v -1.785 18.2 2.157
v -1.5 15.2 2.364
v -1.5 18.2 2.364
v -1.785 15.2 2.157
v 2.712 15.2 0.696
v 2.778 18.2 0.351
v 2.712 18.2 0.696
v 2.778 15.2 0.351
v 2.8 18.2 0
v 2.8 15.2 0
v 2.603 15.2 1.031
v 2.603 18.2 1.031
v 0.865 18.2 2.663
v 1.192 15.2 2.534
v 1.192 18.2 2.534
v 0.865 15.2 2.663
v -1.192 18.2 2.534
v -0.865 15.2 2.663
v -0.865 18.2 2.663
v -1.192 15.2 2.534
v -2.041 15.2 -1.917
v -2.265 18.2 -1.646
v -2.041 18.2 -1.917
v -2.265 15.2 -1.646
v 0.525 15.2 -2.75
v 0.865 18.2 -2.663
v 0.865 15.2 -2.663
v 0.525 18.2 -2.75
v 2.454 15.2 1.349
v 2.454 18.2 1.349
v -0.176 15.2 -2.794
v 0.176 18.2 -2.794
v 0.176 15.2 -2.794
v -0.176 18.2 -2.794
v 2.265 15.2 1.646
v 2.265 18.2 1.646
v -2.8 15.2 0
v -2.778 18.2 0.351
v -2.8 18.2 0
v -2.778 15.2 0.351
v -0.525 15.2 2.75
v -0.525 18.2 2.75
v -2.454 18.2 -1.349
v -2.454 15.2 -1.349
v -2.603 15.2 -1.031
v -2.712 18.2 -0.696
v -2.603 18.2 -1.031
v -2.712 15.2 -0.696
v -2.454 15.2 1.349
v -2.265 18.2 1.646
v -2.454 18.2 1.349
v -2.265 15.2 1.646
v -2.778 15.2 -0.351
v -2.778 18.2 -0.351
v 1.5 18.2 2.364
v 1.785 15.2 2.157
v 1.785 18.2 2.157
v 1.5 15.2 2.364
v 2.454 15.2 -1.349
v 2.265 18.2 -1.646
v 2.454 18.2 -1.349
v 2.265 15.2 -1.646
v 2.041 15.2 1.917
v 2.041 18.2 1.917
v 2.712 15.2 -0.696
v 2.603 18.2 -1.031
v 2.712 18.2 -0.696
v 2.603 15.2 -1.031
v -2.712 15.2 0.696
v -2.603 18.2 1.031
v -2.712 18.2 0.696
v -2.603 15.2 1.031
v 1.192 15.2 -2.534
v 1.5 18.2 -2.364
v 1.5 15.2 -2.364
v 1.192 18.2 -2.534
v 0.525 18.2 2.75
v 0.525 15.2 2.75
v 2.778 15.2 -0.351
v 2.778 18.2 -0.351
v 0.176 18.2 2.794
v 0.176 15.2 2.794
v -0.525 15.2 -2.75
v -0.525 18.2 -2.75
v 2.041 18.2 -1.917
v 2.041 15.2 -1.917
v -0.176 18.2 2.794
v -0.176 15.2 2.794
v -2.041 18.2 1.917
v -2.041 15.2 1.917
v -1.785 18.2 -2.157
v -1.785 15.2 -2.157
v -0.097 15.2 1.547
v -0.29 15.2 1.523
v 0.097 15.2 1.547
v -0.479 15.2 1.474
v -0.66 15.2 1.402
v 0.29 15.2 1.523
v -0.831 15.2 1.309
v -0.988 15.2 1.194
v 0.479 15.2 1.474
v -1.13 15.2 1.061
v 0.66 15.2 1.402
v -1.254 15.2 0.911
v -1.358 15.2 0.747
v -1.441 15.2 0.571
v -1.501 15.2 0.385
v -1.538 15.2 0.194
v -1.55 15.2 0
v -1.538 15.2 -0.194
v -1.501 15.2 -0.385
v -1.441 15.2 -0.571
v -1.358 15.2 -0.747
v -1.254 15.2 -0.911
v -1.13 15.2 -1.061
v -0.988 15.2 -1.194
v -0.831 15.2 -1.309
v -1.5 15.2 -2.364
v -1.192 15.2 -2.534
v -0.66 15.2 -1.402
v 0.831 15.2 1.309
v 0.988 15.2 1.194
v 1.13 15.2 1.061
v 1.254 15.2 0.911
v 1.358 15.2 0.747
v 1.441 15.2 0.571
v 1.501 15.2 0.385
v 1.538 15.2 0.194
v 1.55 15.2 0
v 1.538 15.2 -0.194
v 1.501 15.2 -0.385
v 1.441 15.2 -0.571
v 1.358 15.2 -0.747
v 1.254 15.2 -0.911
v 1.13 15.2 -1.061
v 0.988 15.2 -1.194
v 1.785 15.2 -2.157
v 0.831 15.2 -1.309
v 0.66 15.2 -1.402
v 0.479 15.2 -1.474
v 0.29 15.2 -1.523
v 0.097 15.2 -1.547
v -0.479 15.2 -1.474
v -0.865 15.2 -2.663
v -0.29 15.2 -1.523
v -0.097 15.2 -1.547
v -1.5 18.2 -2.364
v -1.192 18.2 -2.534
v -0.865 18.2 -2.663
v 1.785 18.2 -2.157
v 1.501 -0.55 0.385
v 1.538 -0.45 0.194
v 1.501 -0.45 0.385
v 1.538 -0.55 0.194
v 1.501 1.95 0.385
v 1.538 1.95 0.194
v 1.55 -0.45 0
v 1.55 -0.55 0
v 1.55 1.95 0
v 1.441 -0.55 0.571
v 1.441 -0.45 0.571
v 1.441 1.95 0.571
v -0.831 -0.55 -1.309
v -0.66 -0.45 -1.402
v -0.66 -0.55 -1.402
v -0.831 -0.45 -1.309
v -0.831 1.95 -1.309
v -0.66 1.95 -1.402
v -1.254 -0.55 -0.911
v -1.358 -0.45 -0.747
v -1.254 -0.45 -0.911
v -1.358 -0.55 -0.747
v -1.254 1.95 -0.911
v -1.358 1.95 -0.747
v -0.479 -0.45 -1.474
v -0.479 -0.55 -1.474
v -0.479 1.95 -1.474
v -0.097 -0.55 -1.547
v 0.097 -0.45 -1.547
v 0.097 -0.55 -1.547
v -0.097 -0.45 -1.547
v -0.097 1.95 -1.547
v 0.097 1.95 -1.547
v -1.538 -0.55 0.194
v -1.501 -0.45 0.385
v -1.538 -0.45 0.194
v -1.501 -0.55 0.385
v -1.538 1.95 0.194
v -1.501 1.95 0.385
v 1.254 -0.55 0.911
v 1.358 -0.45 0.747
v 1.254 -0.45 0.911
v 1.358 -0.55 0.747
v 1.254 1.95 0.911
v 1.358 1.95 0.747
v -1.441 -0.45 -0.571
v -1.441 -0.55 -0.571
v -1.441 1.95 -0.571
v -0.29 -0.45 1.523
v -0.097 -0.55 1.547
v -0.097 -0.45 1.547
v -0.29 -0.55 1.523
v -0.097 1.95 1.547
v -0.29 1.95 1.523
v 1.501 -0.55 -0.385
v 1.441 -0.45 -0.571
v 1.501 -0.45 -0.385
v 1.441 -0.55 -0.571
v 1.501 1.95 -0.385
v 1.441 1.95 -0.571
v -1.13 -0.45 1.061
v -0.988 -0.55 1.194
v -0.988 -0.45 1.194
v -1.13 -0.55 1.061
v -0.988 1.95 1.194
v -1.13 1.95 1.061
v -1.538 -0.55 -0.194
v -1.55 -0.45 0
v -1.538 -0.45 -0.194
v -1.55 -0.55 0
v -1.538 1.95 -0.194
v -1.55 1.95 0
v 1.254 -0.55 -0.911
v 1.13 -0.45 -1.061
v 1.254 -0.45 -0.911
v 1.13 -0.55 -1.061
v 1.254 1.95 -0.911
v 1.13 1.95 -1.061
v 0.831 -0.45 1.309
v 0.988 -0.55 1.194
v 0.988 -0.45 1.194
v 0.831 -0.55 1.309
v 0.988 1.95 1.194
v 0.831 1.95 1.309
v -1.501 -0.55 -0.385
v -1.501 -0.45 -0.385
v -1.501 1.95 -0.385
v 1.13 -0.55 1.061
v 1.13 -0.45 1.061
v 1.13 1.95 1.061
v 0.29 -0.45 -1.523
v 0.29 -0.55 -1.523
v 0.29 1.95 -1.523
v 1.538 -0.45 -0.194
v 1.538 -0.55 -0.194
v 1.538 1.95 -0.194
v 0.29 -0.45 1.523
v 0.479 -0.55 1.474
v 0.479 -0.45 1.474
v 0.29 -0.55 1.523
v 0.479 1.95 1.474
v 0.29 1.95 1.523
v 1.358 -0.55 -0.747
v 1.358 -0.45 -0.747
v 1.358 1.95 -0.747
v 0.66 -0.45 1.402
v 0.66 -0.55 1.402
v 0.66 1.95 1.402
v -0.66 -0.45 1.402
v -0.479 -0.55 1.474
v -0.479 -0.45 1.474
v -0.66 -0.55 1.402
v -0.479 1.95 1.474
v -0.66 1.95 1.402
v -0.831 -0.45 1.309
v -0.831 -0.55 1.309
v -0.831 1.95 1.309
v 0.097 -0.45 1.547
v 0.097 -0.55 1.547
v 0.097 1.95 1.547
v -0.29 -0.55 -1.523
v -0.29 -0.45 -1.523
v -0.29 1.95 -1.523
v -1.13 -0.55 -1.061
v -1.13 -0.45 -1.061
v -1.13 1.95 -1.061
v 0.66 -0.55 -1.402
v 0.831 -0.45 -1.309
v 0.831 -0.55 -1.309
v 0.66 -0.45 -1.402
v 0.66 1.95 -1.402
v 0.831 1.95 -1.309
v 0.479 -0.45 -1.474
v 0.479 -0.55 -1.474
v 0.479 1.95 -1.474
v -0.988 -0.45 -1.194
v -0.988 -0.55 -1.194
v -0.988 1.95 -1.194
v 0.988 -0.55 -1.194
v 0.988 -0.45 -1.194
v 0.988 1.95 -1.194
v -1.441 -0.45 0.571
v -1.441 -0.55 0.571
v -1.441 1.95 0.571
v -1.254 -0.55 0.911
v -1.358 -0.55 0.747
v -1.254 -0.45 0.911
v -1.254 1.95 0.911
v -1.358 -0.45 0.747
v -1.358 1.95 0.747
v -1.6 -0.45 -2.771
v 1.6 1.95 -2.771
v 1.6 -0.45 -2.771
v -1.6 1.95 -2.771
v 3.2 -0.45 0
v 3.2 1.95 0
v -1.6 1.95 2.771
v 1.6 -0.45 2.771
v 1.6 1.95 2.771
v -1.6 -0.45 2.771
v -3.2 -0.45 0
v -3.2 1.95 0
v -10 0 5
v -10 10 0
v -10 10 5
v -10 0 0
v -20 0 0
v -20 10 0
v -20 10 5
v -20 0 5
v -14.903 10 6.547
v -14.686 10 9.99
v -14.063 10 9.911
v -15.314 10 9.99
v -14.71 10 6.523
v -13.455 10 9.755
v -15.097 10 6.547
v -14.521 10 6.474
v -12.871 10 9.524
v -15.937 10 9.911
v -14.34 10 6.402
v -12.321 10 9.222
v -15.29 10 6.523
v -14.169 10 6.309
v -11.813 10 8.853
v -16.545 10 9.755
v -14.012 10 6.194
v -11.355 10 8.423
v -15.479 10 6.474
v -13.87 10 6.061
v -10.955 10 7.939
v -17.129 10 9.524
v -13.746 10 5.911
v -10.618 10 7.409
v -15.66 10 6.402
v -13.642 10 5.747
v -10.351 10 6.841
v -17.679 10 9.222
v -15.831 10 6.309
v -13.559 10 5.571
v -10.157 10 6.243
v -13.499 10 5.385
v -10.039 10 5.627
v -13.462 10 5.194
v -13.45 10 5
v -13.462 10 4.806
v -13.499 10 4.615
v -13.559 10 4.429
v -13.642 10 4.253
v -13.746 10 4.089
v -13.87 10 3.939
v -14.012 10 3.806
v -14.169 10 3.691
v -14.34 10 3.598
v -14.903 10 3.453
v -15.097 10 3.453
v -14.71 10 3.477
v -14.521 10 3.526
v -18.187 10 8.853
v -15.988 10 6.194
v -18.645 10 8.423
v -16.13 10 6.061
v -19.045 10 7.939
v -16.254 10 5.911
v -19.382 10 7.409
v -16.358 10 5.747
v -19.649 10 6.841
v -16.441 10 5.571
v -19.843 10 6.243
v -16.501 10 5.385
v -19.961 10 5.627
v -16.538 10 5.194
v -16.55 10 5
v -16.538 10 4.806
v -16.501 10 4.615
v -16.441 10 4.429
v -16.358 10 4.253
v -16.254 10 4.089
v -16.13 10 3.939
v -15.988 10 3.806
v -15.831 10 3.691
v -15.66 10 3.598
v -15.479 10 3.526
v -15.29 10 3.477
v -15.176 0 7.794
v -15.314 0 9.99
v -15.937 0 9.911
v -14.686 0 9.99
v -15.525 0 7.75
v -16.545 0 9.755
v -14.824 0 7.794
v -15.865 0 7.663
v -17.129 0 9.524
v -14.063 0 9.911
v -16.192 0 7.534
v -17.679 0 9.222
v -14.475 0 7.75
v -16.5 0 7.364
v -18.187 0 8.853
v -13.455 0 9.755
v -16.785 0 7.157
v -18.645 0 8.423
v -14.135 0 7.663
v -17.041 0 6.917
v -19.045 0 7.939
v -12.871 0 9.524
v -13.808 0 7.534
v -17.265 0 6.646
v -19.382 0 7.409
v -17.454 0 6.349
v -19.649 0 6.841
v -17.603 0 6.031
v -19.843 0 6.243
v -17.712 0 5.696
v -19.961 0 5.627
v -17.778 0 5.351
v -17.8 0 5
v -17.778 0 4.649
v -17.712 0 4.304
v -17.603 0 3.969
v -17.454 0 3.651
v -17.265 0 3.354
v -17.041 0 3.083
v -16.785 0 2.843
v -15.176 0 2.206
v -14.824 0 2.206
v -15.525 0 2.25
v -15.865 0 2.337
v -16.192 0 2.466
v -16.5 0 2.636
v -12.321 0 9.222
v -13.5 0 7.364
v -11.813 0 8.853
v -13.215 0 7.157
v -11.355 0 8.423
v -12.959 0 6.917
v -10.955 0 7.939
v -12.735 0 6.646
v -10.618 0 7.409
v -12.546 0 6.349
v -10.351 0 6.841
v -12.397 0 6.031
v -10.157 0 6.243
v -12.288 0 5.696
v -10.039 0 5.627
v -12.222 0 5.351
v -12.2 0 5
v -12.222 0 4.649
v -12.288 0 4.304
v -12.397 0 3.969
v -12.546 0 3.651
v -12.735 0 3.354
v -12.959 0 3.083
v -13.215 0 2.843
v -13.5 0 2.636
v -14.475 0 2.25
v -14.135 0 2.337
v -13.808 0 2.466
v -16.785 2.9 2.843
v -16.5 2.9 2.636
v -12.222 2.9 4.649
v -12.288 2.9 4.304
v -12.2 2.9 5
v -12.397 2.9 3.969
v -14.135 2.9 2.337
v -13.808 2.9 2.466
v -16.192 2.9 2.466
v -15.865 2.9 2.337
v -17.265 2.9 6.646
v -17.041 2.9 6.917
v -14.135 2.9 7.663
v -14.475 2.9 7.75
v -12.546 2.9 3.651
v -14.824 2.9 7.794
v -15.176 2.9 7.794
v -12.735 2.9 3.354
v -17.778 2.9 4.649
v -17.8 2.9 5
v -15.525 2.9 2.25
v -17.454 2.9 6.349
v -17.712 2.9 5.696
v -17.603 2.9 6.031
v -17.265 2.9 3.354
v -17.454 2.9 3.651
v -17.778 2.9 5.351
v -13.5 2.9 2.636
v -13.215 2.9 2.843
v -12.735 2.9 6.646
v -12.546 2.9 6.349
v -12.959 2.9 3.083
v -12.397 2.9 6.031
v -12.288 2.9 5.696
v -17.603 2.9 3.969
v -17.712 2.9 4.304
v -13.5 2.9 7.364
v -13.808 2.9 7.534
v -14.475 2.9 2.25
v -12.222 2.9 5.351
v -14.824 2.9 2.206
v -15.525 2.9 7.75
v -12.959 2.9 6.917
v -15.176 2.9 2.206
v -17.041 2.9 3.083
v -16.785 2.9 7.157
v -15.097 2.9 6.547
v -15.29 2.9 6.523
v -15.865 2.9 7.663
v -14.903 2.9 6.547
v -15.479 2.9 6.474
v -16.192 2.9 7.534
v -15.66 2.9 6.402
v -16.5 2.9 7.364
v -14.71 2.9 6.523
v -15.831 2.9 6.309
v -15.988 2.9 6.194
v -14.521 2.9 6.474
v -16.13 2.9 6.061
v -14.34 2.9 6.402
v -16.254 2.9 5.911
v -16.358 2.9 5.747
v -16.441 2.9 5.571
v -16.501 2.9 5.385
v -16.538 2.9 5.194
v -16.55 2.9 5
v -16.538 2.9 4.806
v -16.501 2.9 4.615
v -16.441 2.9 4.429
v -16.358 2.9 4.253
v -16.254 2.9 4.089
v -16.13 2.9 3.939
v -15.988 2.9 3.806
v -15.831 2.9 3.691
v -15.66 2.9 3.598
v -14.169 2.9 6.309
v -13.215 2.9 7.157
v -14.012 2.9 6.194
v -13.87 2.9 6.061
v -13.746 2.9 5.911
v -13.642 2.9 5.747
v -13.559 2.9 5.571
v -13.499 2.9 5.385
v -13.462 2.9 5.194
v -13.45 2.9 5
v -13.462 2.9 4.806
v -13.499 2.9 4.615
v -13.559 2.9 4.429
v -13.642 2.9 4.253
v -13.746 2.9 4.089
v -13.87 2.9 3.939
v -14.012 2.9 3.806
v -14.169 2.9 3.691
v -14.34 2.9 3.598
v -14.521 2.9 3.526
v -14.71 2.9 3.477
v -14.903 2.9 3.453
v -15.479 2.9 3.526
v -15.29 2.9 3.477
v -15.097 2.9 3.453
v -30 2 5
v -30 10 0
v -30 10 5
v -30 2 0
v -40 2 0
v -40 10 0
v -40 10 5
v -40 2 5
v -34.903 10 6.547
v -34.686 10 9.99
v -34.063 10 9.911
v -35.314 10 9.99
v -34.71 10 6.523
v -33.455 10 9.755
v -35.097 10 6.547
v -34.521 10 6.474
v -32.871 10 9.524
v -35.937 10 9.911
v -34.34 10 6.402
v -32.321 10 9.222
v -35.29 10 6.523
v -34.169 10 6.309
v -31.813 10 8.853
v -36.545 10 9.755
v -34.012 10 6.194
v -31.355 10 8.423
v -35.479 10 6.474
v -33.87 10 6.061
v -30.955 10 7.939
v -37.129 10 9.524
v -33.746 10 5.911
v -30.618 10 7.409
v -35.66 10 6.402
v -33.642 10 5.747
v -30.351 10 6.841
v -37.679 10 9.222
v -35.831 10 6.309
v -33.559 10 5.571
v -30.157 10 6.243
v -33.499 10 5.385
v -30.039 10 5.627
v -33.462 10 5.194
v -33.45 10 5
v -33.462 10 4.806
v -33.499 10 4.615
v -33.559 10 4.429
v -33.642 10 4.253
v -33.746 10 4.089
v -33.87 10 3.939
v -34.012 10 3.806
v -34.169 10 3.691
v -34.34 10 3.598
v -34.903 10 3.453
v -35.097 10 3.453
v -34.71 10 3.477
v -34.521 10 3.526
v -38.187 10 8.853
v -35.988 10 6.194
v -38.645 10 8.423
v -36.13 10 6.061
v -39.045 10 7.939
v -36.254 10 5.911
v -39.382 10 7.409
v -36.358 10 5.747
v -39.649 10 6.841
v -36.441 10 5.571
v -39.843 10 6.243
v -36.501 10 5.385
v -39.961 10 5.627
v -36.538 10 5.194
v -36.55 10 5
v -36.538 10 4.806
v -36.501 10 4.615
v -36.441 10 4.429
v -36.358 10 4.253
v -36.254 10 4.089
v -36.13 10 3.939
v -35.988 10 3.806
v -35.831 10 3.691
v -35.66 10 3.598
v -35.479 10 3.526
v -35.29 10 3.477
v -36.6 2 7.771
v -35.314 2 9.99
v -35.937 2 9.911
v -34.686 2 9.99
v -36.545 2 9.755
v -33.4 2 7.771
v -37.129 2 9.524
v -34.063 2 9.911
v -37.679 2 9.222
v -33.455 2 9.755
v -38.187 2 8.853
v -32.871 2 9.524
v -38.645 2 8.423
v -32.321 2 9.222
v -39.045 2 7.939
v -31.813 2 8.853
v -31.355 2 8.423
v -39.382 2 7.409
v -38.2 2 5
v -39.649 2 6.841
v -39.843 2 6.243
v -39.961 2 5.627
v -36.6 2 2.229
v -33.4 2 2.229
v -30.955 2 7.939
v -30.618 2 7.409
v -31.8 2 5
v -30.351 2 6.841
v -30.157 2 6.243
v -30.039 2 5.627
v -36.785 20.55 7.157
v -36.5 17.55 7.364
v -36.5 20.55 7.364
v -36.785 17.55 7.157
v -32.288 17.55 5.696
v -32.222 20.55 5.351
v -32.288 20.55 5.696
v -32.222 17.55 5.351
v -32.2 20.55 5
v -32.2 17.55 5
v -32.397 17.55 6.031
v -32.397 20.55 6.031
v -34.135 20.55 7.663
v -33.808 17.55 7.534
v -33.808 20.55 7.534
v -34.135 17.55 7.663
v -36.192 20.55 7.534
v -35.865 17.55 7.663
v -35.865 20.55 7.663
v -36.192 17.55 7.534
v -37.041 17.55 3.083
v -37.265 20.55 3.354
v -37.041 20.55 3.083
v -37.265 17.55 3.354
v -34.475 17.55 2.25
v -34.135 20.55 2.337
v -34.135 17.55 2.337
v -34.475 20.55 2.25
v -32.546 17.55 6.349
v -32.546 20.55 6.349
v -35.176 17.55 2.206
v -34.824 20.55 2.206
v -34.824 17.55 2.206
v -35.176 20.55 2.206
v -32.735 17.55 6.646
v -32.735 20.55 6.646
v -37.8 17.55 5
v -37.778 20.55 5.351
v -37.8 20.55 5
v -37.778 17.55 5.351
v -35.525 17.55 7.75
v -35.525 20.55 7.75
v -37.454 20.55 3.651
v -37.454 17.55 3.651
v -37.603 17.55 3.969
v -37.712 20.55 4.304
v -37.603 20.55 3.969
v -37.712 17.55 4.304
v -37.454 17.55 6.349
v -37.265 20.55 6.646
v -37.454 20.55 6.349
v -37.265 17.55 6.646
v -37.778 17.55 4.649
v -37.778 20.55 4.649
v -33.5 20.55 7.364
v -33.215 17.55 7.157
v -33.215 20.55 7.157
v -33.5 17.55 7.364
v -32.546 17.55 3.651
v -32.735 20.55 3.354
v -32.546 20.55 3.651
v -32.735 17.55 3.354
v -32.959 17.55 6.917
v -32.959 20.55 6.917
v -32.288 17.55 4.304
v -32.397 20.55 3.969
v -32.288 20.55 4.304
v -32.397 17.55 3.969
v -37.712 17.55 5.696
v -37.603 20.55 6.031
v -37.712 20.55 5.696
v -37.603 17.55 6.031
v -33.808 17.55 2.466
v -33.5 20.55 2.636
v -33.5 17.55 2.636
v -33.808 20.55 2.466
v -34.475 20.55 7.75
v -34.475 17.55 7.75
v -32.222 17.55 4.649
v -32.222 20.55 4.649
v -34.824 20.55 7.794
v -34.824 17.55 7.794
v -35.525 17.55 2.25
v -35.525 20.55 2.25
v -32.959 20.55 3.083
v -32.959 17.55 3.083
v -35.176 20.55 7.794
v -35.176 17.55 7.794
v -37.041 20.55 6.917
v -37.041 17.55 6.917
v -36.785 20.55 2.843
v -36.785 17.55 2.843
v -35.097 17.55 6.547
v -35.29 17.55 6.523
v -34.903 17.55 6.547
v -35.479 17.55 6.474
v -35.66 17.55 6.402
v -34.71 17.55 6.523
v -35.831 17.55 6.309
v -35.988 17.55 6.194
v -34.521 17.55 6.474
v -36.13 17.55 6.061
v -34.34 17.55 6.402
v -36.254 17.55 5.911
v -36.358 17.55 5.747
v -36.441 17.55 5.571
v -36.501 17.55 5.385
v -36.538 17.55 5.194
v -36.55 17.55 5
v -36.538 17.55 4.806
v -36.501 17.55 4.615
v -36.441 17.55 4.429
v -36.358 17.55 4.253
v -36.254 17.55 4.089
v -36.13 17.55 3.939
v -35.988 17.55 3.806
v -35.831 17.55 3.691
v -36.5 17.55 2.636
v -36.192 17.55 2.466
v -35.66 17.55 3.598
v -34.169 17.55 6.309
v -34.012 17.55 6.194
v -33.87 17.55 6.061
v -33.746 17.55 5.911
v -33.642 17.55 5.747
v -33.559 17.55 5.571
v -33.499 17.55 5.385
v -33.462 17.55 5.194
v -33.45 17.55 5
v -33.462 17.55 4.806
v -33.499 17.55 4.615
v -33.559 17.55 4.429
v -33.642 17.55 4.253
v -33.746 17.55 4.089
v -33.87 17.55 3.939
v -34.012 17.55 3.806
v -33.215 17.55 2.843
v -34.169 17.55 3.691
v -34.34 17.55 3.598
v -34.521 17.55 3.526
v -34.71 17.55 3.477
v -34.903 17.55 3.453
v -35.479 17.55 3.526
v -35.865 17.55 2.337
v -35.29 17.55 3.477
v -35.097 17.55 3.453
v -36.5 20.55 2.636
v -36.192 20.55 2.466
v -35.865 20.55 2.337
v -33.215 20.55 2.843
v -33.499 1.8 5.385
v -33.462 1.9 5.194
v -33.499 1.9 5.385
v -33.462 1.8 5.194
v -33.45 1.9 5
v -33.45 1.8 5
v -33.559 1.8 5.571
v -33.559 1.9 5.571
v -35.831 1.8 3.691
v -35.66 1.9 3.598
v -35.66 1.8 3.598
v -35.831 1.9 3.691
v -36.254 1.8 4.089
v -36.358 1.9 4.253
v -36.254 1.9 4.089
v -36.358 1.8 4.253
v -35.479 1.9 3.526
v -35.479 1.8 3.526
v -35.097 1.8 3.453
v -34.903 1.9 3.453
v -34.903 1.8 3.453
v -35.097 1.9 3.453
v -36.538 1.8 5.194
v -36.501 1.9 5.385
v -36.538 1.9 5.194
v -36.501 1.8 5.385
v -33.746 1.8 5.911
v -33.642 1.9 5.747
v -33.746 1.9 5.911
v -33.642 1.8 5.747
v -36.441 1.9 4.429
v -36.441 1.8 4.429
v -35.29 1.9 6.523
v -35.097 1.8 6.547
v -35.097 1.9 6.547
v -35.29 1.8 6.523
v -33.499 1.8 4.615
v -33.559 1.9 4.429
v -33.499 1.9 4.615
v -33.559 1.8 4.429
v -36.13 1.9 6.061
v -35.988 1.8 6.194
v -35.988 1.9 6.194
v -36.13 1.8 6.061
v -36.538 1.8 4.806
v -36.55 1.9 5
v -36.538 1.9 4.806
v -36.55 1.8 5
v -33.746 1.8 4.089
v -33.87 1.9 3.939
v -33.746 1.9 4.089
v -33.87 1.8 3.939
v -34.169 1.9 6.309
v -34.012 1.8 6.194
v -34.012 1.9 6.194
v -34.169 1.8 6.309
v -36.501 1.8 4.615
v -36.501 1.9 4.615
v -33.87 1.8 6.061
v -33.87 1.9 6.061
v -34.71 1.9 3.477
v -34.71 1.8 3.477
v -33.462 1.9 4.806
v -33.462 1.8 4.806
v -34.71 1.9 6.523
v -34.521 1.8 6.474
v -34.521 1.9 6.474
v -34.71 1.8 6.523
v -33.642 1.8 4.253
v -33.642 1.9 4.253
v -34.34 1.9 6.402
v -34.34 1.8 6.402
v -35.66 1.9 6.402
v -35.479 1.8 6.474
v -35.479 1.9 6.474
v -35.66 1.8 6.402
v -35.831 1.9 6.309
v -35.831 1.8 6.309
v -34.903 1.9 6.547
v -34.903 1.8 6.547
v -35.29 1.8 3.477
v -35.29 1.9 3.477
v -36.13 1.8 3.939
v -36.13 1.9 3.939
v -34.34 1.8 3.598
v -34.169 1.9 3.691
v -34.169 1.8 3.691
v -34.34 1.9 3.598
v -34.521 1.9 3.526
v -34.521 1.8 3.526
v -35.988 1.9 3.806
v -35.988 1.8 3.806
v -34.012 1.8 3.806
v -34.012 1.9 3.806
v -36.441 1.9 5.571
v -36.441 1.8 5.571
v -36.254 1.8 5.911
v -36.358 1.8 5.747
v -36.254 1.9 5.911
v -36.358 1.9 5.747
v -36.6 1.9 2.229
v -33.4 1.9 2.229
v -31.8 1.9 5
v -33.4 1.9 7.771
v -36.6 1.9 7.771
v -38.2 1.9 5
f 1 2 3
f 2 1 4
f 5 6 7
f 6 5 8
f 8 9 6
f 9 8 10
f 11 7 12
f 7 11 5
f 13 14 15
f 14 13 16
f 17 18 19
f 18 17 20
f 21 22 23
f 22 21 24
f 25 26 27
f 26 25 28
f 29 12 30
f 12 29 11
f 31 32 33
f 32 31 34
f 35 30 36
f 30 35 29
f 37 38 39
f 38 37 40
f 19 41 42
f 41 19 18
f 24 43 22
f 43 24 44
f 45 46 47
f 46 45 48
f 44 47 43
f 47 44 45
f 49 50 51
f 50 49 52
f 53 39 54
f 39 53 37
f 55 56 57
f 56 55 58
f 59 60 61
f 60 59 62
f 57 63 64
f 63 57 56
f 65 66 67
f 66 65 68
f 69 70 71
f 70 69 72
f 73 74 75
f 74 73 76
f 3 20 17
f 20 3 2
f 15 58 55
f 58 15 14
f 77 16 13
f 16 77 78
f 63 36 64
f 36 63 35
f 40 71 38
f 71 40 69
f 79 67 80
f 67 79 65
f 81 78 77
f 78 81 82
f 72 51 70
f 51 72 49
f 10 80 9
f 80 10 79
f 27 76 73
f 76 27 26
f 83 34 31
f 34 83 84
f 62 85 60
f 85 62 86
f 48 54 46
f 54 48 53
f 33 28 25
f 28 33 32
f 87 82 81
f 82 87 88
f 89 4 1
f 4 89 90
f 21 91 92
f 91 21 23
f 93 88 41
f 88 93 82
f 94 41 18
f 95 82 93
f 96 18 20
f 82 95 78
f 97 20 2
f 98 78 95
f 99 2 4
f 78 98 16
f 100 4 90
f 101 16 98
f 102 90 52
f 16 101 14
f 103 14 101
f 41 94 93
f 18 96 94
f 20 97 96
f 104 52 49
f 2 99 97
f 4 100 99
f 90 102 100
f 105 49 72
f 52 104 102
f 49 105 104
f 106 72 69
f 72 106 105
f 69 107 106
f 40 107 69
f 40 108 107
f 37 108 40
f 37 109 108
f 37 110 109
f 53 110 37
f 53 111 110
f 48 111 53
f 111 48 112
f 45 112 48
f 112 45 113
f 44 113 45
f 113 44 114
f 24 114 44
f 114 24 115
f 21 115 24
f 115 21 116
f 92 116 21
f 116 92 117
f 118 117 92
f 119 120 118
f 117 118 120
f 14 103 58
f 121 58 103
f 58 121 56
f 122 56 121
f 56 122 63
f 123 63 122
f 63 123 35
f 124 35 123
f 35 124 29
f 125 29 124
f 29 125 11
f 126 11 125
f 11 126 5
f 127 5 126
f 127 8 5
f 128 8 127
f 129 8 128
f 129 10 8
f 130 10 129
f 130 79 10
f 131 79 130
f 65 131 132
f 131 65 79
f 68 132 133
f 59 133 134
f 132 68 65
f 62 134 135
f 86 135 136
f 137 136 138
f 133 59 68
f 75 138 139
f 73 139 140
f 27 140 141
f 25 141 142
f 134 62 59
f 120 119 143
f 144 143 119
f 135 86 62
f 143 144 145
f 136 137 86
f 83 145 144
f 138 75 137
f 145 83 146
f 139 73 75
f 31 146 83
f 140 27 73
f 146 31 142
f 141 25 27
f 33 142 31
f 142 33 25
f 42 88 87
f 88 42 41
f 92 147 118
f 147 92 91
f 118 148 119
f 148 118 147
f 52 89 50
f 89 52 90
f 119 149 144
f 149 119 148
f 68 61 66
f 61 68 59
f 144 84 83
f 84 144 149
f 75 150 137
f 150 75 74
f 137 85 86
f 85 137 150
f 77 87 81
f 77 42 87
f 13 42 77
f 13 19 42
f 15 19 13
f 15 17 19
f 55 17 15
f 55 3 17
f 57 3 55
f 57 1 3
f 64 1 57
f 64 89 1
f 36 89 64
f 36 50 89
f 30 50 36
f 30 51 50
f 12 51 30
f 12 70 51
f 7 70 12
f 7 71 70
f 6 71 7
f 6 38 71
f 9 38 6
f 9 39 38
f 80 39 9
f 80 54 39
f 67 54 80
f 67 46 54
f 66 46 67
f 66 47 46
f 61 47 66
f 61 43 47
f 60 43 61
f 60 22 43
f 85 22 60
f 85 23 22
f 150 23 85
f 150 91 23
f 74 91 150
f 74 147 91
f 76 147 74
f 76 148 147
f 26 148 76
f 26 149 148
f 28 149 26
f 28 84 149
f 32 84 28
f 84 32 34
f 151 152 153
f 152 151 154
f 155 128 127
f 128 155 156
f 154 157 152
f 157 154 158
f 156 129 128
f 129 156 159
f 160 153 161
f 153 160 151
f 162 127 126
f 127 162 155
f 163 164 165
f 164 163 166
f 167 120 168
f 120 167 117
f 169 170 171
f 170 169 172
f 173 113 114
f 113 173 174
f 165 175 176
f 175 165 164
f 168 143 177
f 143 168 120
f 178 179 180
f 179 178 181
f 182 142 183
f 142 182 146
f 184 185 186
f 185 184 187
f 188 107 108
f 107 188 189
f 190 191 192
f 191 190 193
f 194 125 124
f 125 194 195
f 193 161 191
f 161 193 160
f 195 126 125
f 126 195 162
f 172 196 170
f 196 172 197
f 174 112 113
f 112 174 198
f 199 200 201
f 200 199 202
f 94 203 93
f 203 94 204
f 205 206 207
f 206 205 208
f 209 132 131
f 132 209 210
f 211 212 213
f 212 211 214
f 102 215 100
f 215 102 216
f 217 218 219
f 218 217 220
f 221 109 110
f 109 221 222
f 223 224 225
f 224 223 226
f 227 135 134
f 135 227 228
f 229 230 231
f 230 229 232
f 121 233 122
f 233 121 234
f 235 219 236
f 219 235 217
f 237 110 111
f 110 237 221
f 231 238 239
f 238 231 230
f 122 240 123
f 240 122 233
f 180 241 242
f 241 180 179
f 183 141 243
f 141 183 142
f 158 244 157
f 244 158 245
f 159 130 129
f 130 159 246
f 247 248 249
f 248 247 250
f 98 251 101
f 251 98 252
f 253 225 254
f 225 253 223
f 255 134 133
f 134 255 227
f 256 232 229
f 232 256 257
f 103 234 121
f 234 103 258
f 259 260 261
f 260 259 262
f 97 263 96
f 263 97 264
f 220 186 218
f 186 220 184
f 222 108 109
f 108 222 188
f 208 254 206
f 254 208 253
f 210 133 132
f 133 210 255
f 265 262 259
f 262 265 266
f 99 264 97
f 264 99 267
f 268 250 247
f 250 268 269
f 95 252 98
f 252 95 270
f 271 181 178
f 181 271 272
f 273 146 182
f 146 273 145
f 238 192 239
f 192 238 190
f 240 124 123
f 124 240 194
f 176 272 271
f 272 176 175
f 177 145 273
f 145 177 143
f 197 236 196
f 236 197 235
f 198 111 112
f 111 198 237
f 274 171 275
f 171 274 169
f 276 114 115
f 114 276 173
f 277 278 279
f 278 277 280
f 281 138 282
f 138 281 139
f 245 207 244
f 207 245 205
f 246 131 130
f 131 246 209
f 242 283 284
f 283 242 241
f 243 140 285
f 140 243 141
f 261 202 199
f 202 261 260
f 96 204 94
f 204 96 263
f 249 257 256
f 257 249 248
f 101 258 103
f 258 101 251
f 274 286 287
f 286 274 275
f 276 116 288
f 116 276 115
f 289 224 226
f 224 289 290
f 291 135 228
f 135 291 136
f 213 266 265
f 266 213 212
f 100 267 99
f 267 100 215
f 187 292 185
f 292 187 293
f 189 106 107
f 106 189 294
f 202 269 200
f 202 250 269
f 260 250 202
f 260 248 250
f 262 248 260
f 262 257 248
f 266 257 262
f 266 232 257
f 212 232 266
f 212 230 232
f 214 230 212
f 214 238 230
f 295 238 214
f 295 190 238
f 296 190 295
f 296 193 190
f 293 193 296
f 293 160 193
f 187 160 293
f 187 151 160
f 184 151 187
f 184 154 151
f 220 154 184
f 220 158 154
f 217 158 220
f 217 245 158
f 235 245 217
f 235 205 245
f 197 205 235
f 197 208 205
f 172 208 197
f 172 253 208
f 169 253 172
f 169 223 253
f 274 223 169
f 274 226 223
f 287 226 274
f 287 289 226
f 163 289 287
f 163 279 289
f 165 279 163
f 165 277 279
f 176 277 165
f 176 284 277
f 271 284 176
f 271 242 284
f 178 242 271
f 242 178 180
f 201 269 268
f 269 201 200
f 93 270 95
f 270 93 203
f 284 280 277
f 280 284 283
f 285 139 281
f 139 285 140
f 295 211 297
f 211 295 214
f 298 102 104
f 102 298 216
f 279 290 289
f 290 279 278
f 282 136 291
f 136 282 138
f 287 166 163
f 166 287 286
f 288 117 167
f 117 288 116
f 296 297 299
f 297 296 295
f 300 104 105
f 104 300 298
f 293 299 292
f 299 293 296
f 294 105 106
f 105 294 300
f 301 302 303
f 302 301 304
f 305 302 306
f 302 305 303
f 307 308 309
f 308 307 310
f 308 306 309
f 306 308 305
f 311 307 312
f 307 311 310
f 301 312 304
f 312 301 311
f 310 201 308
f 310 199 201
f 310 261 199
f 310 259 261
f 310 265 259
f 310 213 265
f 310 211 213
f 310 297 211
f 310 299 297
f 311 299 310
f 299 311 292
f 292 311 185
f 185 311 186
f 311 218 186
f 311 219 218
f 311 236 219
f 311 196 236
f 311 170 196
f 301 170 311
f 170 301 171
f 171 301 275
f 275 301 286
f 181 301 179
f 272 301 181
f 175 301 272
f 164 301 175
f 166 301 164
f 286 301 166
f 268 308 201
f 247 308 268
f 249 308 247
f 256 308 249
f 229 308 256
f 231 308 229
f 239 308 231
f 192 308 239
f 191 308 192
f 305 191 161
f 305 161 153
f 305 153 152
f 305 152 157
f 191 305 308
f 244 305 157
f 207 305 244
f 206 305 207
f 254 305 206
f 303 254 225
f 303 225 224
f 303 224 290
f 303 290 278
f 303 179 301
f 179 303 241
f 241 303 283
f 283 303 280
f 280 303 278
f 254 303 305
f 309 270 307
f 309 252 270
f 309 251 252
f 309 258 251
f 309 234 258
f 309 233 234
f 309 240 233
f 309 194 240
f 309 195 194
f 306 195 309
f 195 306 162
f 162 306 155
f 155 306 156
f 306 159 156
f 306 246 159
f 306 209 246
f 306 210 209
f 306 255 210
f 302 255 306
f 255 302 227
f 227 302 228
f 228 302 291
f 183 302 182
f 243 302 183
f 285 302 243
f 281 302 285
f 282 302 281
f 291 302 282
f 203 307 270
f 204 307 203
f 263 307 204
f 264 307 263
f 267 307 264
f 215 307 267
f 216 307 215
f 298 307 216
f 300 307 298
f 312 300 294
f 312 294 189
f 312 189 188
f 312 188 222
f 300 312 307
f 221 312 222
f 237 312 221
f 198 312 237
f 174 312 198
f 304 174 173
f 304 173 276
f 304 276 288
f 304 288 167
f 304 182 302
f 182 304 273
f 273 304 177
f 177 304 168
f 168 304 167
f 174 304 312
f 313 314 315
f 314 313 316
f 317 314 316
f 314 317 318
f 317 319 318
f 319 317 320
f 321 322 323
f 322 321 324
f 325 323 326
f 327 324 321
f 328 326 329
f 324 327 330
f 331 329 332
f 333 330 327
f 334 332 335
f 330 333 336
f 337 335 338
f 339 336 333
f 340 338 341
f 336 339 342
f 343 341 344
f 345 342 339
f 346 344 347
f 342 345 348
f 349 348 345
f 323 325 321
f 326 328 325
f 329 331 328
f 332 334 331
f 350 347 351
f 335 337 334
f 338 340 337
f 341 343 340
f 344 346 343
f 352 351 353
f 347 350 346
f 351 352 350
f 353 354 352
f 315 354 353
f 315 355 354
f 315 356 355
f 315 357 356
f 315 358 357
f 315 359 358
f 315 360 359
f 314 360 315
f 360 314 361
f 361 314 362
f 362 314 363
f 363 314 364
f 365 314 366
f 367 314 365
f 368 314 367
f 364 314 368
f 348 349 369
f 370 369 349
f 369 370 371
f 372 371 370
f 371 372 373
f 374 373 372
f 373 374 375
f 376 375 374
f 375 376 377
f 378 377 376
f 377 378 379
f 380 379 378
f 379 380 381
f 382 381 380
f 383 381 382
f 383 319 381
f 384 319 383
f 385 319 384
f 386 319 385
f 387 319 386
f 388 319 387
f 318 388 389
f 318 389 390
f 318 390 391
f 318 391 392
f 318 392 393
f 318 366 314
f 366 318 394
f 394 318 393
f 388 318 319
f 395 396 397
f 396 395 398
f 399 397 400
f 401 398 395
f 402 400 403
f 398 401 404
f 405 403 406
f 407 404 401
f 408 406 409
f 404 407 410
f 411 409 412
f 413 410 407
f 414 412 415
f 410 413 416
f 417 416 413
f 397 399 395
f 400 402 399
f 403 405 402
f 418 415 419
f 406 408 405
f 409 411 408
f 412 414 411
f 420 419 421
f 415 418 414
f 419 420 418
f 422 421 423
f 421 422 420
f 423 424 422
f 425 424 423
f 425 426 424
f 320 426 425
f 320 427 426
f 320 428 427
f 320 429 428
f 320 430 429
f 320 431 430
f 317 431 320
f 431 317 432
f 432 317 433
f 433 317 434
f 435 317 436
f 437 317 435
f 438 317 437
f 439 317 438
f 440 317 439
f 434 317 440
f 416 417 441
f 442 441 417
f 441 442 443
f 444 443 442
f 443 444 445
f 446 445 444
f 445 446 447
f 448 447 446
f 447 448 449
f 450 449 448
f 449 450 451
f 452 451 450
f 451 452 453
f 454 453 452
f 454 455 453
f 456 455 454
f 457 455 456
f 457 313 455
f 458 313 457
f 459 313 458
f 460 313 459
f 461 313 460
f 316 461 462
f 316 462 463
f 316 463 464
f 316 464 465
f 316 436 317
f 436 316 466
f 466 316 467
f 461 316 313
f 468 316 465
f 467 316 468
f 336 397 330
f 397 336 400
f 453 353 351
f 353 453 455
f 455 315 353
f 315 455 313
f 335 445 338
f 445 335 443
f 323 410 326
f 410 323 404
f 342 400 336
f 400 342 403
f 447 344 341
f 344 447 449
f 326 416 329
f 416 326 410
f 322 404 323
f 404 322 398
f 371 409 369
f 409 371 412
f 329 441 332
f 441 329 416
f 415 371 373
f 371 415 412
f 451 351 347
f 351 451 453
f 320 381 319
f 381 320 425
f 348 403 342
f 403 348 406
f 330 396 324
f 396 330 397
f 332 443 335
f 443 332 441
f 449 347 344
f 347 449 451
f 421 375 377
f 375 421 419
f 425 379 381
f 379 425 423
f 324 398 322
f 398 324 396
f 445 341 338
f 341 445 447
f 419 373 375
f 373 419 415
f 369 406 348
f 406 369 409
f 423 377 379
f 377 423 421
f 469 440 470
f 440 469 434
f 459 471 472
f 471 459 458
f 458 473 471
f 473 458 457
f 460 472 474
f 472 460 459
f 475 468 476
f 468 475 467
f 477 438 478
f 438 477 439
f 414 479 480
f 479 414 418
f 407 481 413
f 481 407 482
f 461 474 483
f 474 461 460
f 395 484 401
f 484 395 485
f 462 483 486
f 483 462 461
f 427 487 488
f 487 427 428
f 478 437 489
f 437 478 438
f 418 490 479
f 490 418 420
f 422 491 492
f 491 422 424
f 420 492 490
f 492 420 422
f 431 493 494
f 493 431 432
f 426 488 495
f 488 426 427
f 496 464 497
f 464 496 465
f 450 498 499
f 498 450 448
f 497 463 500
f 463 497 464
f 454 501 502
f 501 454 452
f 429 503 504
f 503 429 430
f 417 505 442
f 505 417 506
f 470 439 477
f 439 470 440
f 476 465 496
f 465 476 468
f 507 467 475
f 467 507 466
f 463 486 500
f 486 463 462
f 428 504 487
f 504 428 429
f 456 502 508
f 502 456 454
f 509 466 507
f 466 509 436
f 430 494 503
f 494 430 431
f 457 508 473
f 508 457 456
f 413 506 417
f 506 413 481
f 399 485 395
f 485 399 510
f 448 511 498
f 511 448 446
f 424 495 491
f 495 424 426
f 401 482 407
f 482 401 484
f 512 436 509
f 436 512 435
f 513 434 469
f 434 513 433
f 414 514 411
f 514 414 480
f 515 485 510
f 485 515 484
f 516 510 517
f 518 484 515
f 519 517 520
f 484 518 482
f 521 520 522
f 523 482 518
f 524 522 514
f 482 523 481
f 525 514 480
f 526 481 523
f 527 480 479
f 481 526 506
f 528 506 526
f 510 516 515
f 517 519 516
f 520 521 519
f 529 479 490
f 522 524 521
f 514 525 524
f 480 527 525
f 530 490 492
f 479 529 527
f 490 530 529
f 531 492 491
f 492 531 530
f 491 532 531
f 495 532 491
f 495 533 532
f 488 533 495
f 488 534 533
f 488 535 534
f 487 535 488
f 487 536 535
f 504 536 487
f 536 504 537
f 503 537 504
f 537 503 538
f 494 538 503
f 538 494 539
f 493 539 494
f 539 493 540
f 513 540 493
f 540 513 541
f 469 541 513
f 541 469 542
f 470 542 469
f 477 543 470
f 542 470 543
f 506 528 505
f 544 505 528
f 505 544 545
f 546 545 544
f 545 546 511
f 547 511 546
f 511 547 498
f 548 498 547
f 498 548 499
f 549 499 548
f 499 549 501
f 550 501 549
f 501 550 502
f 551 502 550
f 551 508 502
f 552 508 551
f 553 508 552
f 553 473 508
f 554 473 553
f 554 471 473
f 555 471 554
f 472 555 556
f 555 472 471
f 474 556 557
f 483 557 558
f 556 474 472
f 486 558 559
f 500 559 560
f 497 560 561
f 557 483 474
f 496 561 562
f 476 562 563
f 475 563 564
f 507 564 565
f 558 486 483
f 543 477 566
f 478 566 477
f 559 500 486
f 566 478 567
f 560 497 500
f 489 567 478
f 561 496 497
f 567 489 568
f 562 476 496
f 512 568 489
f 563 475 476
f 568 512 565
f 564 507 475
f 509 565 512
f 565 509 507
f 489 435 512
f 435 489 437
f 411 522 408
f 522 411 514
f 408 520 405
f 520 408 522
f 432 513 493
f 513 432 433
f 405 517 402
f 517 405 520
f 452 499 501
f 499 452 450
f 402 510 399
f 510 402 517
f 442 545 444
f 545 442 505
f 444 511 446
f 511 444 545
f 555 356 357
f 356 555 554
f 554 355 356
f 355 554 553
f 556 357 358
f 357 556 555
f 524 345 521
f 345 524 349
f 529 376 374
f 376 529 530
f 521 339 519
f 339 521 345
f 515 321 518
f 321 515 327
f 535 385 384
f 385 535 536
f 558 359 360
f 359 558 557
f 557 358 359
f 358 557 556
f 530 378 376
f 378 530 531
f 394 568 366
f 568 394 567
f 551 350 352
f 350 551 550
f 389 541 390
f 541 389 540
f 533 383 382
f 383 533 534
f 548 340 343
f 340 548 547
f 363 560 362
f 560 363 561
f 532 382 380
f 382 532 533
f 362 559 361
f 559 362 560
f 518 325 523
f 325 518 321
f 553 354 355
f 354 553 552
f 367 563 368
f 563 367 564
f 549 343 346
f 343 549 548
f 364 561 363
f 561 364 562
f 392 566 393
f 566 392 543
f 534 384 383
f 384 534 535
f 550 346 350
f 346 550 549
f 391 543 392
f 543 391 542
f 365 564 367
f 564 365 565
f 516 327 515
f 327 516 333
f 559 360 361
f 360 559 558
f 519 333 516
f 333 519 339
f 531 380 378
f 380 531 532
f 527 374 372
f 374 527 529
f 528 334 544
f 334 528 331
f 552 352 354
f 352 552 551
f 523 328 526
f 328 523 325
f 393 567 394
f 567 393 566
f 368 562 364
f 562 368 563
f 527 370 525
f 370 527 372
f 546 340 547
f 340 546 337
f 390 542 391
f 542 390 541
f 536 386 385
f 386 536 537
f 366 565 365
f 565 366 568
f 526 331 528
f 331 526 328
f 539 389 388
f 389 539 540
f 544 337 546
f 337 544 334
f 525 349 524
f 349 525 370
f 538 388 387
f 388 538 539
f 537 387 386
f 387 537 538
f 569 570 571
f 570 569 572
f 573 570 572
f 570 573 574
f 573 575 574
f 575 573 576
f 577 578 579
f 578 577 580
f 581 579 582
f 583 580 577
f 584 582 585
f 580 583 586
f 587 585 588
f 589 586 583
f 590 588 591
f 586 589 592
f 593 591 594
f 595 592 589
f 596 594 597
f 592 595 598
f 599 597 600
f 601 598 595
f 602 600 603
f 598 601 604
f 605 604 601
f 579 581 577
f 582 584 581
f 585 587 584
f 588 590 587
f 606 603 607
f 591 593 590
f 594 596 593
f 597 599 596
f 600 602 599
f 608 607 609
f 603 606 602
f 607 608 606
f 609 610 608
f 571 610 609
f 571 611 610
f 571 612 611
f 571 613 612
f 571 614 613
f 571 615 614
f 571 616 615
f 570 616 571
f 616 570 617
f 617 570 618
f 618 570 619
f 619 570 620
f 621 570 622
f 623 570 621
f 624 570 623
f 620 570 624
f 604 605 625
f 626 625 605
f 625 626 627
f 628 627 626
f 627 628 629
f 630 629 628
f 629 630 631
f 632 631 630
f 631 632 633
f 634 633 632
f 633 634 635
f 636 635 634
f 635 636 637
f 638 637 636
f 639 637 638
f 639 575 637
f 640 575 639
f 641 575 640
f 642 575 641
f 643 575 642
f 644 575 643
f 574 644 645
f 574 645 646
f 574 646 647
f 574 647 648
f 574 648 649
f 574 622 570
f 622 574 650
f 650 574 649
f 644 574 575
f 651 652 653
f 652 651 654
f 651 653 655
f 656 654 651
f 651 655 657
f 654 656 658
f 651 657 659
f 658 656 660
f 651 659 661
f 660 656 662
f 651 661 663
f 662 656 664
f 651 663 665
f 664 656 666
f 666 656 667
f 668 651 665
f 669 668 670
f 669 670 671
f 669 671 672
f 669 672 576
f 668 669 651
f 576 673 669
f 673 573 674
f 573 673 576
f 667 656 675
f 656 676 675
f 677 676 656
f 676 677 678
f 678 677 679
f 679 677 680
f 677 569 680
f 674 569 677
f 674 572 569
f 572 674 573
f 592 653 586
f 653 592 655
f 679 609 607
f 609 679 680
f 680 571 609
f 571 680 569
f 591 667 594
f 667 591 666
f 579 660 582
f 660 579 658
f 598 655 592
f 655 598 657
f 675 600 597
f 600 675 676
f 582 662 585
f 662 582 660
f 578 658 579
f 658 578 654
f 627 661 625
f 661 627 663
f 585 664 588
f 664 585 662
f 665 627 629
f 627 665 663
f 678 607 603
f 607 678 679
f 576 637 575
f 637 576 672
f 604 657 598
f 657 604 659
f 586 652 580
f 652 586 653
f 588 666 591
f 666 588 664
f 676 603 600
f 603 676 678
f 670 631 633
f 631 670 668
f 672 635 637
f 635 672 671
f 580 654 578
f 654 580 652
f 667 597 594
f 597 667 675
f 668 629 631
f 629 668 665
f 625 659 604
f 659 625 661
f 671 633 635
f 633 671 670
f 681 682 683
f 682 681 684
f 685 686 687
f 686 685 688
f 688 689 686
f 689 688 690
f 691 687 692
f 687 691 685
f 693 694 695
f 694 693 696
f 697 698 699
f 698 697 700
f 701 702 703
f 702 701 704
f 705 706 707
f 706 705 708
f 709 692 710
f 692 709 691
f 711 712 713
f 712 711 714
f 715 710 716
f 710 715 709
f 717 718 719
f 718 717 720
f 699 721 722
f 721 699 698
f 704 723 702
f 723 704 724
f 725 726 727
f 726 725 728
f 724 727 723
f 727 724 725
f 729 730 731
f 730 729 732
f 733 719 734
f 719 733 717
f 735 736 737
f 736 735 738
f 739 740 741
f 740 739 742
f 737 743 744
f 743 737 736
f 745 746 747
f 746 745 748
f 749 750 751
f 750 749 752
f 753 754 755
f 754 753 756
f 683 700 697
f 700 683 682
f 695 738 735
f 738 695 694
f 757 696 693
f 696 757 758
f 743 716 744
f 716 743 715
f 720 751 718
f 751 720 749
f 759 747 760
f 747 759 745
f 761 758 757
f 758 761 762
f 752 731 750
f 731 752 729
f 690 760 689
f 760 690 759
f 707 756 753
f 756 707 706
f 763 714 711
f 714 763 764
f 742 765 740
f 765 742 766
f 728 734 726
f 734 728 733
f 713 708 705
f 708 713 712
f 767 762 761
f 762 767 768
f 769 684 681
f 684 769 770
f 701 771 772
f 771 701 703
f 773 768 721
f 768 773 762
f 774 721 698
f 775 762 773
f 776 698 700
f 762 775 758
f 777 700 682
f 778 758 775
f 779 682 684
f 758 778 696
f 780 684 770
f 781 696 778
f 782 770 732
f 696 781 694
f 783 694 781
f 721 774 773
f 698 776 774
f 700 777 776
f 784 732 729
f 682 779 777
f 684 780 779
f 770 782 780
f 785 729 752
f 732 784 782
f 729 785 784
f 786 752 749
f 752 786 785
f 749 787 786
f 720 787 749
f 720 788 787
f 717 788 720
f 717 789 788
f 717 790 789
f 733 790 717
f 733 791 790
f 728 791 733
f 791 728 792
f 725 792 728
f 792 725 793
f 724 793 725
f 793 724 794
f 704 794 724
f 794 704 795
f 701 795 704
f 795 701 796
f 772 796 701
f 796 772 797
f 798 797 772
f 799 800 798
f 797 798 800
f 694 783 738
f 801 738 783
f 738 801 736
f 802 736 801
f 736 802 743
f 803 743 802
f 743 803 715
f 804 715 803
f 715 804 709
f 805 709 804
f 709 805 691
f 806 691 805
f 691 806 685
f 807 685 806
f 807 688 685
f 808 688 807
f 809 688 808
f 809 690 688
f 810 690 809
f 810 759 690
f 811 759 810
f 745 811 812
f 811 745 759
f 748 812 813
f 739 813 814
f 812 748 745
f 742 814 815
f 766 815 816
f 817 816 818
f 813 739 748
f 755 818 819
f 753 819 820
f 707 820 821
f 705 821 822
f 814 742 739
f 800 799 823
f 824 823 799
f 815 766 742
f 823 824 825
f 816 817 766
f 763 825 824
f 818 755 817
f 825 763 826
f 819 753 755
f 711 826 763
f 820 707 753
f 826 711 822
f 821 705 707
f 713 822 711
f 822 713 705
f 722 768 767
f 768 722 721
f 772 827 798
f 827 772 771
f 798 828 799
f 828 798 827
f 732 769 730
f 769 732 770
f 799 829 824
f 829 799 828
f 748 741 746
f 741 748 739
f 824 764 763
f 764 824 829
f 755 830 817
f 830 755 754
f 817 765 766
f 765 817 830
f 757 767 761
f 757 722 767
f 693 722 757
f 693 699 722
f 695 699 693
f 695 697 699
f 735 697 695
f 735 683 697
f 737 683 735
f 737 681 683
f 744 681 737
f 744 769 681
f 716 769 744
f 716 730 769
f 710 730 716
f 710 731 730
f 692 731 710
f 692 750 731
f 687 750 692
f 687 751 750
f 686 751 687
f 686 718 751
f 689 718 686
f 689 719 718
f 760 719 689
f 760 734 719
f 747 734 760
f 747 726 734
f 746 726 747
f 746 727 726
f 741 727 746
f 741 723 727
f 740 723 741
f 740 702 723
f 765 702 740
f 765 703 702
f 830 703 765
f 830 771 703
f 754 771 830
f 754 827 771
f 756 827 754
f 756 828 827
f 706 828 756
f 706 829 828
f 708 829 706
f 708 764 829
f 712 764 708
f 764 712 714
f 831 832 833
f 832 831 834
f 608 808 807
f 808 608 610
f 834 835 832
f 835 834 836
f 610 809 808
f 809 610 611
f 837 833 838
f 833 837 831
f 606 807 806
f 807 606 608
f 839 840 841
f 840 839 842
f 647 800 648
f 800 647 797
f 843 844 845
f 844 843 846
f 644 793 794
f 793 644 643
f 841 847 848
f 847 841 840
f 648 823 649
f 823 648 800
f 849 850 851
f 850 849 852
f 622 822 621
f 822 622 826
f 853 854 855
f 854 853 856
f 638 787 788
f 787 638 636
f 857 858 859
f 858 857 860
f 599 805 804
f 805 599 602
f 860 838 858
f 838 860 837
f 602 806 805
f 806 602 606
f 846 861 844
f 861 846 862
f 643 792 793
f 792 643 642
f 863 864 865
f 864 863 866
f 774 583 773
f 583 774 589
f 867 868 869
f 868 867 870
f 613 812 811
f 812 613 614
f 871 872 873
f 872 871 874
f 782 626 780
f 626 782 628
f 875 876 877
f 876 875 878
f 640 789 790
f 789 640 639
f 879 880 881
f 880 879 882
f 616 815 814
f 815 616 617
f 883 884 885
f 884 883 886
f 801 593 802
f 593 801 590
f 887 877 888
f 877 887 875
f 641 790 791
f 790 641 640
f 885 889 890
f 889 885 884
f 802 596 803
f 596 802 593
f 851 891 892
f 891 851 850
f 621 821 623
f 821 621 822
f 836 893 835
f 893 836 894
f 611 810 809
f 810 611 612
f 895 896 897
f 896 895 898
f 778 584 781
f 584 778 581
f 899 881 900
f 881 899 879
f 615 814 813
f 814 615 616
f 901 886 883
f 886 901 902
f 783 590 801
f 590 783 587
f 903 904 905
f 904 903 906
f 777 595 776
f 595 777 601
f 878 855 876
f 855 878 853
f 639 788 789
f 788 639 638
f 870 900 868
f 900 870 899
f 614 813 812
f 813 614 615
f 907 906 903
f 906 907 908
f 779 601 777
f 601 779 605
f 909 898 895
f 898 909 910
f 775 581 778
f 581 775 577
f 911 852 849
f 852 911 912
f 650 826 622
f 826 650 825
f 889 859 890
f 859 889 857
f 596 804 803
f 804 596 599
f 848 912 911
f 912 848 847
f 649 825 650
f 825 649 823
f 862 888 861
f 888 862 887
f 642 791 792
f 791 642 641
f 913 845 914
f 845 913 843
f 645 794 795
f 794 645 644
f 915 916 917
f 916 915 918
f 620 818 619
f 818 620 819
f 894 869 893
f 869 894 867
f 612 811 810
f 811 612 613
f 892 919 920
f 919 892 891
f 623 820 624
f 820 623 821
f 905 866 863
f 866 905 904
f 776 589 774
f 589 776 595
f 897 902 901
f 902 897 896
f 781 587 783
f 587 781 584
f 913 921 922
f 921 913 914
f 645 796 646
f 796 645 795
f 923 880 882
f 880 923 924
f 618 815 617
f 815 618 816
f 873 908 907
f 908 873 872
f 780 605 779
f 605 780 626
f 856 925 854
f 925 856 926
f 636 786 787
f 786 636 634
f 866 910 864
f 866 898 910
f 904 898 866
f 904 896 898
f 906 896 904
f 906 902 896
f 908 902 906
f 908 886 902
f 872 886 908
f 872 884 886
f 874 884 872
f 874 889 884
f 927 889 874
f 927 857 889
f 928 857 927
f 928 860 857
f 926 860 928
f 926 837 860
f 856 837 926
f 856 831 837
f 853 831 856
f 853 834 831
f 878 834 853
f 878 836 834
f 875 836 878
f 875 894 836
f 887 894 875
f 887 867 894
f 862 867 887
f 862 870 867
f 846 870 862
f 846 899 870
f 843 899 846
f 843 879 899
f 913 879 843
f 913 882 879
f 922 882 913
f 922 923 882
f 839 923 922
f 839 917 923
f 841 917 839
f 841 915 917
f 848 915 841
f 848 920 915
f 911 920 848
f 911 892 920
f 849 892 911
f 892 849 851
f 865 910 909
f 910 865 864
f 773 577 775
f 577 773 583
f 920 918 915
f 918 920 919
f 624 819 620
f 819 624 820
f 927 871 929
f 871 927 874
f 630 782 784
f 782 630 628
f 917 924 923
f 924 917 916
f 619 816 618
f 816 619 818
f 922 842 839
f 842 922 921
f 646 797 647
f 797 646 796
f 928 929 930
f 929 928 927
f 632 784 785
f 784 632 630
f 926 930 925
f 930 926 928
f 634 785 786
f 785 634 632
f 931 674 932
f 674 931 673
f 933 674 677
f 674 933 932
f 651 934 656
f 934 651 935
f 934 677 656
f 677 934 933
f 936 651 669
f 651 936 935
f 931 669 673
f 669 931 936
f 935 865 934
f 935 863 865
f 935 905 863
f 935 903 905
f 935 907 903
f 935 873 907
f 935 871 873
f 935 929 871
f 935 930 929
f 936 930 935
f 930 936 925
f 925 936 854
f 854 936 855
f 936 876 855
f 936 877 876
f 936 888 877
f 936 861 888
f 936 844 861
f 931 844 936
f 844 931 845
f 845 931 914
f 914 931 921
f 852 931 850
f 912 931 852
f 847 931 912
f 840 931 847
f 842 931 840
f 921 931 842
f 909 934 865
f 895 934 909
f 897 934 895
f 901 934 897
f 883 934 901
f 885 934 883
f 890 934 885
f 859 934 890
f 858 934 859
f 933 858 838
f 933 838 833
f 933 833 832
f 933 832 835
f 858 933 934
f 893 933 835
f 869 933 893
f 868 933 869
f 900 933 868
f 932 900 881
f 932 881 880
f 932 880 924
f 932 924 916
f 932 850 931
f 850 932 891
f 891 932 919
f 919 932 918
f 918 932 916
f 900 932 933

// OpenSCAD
$fn=50;

width = 198.0;
length = 367.0;
height = 2.0;
screw = 3.45;
frame = 20;
vent_width = 5;
vents = 22;

part0=false;
part1=false;
test=true;
low=true;

module intersection(x, y, z) {
    translate([x, y, z]) {
        polyhedron(
            points=[
                [0,0,0],
                [0,0,height],
                [width/4,0,height],
                [width/4,0,0],
                [width/4,height,0],
                [0,height,0]
            ],
            faces=[
                [0,1,2],
                [2,3,0],
                [1,0,5],
                [3,2,4],
                [0,3,5],
                [3,4,5],
                [2,1,4],
                [4,1,5]
            ]
        );
    };
};

module hole(x, y, z) {
    translate([x, y, z]) {
        translate([0, 0, -0.5]) {
            cylinder(height+1, d=screw, true);
        };
    };
};

module vent(x, y, z) {
    translate([x, y, z]) {
        translate([vent_width/2, vent_width/2, -0.5]) {
            hull() {
                translate([0, (length/2)-(2*frame), 0])
                    cylinder(height+1, d=vent_width, false);
                cylinder(height+1, d=vent_width, false);
            };
        };
    };
};

module bolt(x, y, z) {
    translate([x, y, z]) {
        difference() {
            translate([0, 0, 0]) {
                union() {
                    cube([10, 10, 5], false);
                    translate([10/2, 10, 5]) {
                        rotate(a=90, v=[1, 0, 0]) {
                            cylinder(10, d=10, false);
                        };
                    };
                };
            };
            translate([10/2, -0.1, 5]) screw();
        };
    };
};

module nut(x, y, z) {
    translate([x, y, z]) {
        difference() {
            translate([0, height, 0]) {
                union() {
                    cube([10, 10-height, 5], false);
                    translate([10/2, 10-height, 5])
                        rotate(a=90, v=[1, 0, 0])
                            cylinder(10-height, d=10, false);
                };
            };
            translate([10/2, height+screw_length-0.1-0.1, 5]) rotate(a=180, v=[1, 0, 0]) screw();
        };
        translate([10/2, height+screw_length-0.1-0.1, 5]) rotate(a=180, v=[1, 0, 0]) screw();
    };
};

module screw() {
    color("green")
        rotate(a=270, v=[1, 0, 0]) {
            cylinder(screw_head_height, d=screw_head_width, true);
            cylinder(screw_length, d=screw_diameter, true);
            translate([0, 0, screw_length-screw_nut_height-0.1]) cylinder($fn=6, screw_nut_height, d=screw_nut_width, true);
    };
};

module plate() {

    nut(((width-10-10-10)/3*0)+10,(length/2)-10-height,height);
    bolt(((width-10-10-10)/3*1)+10,(length/2)-10,height);
    nut(((width-10-10-10)/3*2)+10,(length/2)-10-height,height);
    bolt(((width-10-10-10)/3*3)+10,(length/2)-10,height);

    intersection(width/4*0, length/2-height, 0);
    translate([width/4*3, 0, height])
        rotate(a=180, v=[0, 1, 0])
            intersection(width/4*1, length/2-height, 0);
    intersection(width/4*2, length/2-height, 0);
    translate([width/4*7, 0, height])
        rotate(a=180, v=[0, 1, 0])
            intersection(width/4*3, length/2-height, 0);

    difference() {
        cube([width, length/2-height, height]);

        hole(5.2, 5.2, 0);
        hole(width-5.2, 5.2, 0);

        for(x = [frame : (width-2*frame-vent_width)/vents : width-frame])
            vent(x, frame, 0);
    };
}

screw_head_width=5.6;
screw_head_height=3;
screw_diameter=3.1;
screw_length=18.75;
screw_nut_width=6.4;
screw_nut_height=2.4;

if (part0) {
    plate();
}

if (part1) {
    color("red")
        translate([width, length-height, 0])
            rotate(a=180, v=[0,0,1])
                plate();
};

if (test) {
    /* screw(); */
    /* rotate(a=180, v=[1, 0, 0]) screw(); */
    translate([0, 4+14.2, 0]) rotate(a=180, v=[1, 0, 0]) screw();
    bolt(-20,0,0);
    nut(-40, 0, 0);
}
